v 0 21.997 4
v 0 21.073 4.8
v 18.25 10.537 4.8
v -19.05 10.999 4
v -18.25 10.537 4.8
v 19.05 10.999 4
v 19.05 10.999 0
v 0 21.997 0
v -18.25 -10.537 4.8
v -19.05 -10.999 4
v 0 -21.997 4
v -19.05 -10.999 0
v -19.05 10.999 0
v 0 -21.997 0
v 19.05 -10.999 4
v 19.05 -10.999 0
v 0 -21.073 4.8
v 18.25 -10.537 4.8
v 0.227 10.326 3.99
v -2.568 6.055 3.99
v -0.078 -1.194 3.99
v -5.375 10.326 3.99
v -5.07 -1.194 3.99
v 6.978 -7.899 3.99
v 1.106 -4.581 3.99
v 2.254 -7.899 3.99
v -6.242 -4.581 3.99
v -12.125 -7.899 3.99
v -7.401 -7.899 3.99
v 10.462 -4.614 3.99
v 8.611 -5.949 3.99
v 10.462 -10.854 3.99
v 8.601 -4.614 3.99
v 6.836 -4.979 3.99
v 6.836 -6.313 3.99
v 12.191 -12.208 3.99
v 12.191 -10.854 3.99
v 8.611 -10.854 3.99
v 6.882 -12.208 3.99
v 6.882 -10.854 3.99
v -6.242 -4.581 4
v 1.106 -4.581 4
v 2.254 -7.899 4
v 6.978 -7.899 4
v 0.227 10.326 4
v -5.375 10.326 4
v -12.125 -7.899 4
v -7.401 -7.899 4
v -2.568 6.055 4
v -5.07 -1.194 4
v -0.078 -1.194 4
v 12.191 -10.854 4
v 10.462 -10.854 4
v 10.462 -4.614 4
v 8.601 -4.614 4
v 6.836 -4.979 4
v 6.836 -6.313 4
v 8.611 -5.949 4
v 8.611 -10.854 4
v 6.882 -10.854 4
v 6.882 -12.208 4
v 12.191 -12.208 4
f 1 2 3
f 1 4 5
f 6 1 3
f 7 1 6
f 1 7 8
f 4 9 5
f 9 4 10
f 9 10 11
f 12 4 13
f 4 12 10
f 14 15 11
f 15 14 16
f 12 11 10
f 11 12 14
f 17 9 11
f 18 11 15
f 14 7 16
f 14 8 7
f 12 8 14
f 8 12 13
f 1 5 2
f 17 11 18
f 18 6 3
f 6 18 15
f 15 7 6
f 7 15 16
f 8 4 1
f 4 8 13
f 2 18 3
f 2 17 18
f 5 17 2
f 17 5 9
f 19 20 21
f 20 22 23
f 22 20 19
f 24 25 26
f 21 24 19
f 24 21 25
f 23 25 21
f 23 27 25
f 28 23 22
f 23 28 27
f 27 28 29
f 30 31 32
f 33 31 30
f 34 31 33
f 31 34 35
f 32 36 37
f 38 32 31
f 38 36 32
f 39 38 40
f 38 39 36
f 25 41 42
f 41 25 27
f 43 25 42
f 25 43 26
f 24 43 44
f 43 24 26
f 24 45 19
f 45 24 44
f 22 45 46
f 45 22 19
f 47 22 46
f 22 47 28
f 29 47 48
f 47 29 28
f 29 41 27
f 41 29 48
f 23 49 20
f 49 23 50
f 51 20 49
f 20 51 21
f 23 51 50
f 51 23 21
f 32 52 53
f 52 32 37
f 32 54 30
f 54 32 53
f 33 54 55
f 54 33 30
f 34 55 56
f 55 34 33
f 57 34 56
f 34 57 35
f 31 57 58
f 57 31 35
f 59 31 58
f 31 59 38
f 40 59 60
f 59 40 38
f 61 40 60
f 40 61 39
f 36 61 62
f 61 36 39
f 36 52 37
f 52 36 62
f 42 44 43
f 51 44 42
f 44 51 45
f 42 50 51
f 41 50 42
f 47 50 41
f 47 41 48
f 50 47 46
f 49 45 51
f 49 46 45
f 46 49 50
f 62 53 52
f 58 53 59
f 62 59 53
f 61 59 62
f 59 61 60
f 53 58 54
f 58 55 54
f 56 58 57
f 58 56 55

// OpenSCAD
// ========================================================================
// Parametric Dual-Color Hexagonal Scrabble 3D Printable Tile
// OpenSCAD Customizer Compatible
// ========================================================================

/* [Tile Dimensions] */
// Flat-to-flat diameter in mm (38.1 mm = 1.5 inches)
tile_flat_to_flat = 38.1; // [20.0:0.1:100.0]

// Total tile height/thickness in mm
tile_height = 4.8; // [2.0:0.1:15.0]

// 45-degree top perimeter chamfer size in mm
chamfer = 0.8; // [0.0:0.1:3.0]

// Recessed inlay depth for the glyphs in mm
inlay_depth = 0.8; // [0.2:0.1:3.0]

// Additional raised emboss height above tile surface (0 for flush)
emboss_height = 0.0; // [0.0:0.1:3.0]

/* [Text & Glyphs] */
// Main letter, number, or symbol
char_letter = "A";

// Scrabble score subscript (leave empty for none)
char_score = "1";

// Main character font size
letter_size = 18.0; // [8.0:0.5:30.0]

// Score subscript font size
score_size = 7.5; // [4.0:0.5:15.0]

// Font name and style
font_name = "Trebuchet MS:style=Bold";

/* [Rendering & Multi-Material Mode] */
// Select which parts to render
render_mode = "both"; // [both:Dual Color Assembly, base_only:Base Tile Only, text_only:Text Inlay Only, cutaway:Cross Section View]

// Preview color for base tile
color_base = "Ivory";

// Preview color for text
color_text = "#151515";

/* [Hidden] */
$fn = 6; // Regular hexagon

// Calculate Hexagon radii
r_flat = tile_flat_to_flat / 2.0;
r_vertex = r_flat / cos(30);

r_top_flat = (tile_flat_to_flat - 2 * chamfer) / 2.0;
r_top_vertex = r_top_flat / cos(30);

// --- 2D Hexagon Profile ---
module hex_profile(radius) {
    rotate([0, 0, 30])
    circle(r = radius, $fn = 6);
}

// --- Solid Chamfered Base Hexagon ---
module solid_hex_base() {
    hull() {
        // Lower straight portion (z = 0 to z = tile_height - chamfer)
        linear_extrude(height = max(0.01, tile_height - chamfer))
            hex_profile(r_vertex);
            
        // Upper chamfered portion (z = tile_height - chamfer to z = tile_height)
        translate([0, 0, tile_height - 0.01])
            linear_extrude(height = 0.01)
                hex_profile(r_top_vertex);
    }
}

// --- 2D Text & Score Layout ---
module glyphs_2d() {
    // Main letter
    if (len(char_letter) > 0) {
        shift_x = (len(char_score) > 0 && char_score != "0") ? -2.8 : 0.0;
        shift_y = (len(char_score) > 0 && char_score != "0") ? 1.0 : 0.0;
        
        translate([shift_x, shift_y, 0])
        text(
            text = char_letter,
            size = letter_size,
            font = font_name,
            halign = "center",
            valign = "center"
        );
    }
    
    // Subscript score
    if (len(char_score) > 0 && char_score != "0") {
        translate([9.2, -8.5, 0])
        text(
            text = char_score,
            size = score_size,
            font = font_name,
            halign = "center",
            valign = "center"
        );
    }
}

// --- 3D Text Inlay Mesh ---
module text_inlay_3d() {
    z_start = tile_height - inlay_depth;
    total_text_h = inlay_depth + emboss_height;
    
    translate([0, 0, z_start])
    linear_extrude(height = total_text_h, convexity = 10)
        glyphs_2d();
}

// --- 3D Base Tile with Cavity ---
module base_tile_3d() {
    difference() {
        solid_hex_base();
        
        // Subtract glyph cavity from the top
        translate([0, 0, tile_height - inlay_depth - 0.01])
        linear_extrude(height = inlay_depth + 1.0, convexity = 10)
            glyphs_2d();
    }
}

// --- Main Assembly Renderer ---
if (render_mode == "both") {
    color(color_base)
        base_tile_3d();
        
    color(color_text)
        text_inlay_3d();
}
else if (render_mode == "base_only") {
    base_tile_3d();
}
else if (render_mode == "text_only") {
    text_inlay_3d();
}
else if (render_mode == "cutaway") {
    difference() {
        union() {
            color(color_base) base_tile_3d();
            color(color_text) text_inlay_3d();
        }
        // Cut front half
        translate([-50, 0, -5])
            cube([100, 50, 20]);
    }
}
